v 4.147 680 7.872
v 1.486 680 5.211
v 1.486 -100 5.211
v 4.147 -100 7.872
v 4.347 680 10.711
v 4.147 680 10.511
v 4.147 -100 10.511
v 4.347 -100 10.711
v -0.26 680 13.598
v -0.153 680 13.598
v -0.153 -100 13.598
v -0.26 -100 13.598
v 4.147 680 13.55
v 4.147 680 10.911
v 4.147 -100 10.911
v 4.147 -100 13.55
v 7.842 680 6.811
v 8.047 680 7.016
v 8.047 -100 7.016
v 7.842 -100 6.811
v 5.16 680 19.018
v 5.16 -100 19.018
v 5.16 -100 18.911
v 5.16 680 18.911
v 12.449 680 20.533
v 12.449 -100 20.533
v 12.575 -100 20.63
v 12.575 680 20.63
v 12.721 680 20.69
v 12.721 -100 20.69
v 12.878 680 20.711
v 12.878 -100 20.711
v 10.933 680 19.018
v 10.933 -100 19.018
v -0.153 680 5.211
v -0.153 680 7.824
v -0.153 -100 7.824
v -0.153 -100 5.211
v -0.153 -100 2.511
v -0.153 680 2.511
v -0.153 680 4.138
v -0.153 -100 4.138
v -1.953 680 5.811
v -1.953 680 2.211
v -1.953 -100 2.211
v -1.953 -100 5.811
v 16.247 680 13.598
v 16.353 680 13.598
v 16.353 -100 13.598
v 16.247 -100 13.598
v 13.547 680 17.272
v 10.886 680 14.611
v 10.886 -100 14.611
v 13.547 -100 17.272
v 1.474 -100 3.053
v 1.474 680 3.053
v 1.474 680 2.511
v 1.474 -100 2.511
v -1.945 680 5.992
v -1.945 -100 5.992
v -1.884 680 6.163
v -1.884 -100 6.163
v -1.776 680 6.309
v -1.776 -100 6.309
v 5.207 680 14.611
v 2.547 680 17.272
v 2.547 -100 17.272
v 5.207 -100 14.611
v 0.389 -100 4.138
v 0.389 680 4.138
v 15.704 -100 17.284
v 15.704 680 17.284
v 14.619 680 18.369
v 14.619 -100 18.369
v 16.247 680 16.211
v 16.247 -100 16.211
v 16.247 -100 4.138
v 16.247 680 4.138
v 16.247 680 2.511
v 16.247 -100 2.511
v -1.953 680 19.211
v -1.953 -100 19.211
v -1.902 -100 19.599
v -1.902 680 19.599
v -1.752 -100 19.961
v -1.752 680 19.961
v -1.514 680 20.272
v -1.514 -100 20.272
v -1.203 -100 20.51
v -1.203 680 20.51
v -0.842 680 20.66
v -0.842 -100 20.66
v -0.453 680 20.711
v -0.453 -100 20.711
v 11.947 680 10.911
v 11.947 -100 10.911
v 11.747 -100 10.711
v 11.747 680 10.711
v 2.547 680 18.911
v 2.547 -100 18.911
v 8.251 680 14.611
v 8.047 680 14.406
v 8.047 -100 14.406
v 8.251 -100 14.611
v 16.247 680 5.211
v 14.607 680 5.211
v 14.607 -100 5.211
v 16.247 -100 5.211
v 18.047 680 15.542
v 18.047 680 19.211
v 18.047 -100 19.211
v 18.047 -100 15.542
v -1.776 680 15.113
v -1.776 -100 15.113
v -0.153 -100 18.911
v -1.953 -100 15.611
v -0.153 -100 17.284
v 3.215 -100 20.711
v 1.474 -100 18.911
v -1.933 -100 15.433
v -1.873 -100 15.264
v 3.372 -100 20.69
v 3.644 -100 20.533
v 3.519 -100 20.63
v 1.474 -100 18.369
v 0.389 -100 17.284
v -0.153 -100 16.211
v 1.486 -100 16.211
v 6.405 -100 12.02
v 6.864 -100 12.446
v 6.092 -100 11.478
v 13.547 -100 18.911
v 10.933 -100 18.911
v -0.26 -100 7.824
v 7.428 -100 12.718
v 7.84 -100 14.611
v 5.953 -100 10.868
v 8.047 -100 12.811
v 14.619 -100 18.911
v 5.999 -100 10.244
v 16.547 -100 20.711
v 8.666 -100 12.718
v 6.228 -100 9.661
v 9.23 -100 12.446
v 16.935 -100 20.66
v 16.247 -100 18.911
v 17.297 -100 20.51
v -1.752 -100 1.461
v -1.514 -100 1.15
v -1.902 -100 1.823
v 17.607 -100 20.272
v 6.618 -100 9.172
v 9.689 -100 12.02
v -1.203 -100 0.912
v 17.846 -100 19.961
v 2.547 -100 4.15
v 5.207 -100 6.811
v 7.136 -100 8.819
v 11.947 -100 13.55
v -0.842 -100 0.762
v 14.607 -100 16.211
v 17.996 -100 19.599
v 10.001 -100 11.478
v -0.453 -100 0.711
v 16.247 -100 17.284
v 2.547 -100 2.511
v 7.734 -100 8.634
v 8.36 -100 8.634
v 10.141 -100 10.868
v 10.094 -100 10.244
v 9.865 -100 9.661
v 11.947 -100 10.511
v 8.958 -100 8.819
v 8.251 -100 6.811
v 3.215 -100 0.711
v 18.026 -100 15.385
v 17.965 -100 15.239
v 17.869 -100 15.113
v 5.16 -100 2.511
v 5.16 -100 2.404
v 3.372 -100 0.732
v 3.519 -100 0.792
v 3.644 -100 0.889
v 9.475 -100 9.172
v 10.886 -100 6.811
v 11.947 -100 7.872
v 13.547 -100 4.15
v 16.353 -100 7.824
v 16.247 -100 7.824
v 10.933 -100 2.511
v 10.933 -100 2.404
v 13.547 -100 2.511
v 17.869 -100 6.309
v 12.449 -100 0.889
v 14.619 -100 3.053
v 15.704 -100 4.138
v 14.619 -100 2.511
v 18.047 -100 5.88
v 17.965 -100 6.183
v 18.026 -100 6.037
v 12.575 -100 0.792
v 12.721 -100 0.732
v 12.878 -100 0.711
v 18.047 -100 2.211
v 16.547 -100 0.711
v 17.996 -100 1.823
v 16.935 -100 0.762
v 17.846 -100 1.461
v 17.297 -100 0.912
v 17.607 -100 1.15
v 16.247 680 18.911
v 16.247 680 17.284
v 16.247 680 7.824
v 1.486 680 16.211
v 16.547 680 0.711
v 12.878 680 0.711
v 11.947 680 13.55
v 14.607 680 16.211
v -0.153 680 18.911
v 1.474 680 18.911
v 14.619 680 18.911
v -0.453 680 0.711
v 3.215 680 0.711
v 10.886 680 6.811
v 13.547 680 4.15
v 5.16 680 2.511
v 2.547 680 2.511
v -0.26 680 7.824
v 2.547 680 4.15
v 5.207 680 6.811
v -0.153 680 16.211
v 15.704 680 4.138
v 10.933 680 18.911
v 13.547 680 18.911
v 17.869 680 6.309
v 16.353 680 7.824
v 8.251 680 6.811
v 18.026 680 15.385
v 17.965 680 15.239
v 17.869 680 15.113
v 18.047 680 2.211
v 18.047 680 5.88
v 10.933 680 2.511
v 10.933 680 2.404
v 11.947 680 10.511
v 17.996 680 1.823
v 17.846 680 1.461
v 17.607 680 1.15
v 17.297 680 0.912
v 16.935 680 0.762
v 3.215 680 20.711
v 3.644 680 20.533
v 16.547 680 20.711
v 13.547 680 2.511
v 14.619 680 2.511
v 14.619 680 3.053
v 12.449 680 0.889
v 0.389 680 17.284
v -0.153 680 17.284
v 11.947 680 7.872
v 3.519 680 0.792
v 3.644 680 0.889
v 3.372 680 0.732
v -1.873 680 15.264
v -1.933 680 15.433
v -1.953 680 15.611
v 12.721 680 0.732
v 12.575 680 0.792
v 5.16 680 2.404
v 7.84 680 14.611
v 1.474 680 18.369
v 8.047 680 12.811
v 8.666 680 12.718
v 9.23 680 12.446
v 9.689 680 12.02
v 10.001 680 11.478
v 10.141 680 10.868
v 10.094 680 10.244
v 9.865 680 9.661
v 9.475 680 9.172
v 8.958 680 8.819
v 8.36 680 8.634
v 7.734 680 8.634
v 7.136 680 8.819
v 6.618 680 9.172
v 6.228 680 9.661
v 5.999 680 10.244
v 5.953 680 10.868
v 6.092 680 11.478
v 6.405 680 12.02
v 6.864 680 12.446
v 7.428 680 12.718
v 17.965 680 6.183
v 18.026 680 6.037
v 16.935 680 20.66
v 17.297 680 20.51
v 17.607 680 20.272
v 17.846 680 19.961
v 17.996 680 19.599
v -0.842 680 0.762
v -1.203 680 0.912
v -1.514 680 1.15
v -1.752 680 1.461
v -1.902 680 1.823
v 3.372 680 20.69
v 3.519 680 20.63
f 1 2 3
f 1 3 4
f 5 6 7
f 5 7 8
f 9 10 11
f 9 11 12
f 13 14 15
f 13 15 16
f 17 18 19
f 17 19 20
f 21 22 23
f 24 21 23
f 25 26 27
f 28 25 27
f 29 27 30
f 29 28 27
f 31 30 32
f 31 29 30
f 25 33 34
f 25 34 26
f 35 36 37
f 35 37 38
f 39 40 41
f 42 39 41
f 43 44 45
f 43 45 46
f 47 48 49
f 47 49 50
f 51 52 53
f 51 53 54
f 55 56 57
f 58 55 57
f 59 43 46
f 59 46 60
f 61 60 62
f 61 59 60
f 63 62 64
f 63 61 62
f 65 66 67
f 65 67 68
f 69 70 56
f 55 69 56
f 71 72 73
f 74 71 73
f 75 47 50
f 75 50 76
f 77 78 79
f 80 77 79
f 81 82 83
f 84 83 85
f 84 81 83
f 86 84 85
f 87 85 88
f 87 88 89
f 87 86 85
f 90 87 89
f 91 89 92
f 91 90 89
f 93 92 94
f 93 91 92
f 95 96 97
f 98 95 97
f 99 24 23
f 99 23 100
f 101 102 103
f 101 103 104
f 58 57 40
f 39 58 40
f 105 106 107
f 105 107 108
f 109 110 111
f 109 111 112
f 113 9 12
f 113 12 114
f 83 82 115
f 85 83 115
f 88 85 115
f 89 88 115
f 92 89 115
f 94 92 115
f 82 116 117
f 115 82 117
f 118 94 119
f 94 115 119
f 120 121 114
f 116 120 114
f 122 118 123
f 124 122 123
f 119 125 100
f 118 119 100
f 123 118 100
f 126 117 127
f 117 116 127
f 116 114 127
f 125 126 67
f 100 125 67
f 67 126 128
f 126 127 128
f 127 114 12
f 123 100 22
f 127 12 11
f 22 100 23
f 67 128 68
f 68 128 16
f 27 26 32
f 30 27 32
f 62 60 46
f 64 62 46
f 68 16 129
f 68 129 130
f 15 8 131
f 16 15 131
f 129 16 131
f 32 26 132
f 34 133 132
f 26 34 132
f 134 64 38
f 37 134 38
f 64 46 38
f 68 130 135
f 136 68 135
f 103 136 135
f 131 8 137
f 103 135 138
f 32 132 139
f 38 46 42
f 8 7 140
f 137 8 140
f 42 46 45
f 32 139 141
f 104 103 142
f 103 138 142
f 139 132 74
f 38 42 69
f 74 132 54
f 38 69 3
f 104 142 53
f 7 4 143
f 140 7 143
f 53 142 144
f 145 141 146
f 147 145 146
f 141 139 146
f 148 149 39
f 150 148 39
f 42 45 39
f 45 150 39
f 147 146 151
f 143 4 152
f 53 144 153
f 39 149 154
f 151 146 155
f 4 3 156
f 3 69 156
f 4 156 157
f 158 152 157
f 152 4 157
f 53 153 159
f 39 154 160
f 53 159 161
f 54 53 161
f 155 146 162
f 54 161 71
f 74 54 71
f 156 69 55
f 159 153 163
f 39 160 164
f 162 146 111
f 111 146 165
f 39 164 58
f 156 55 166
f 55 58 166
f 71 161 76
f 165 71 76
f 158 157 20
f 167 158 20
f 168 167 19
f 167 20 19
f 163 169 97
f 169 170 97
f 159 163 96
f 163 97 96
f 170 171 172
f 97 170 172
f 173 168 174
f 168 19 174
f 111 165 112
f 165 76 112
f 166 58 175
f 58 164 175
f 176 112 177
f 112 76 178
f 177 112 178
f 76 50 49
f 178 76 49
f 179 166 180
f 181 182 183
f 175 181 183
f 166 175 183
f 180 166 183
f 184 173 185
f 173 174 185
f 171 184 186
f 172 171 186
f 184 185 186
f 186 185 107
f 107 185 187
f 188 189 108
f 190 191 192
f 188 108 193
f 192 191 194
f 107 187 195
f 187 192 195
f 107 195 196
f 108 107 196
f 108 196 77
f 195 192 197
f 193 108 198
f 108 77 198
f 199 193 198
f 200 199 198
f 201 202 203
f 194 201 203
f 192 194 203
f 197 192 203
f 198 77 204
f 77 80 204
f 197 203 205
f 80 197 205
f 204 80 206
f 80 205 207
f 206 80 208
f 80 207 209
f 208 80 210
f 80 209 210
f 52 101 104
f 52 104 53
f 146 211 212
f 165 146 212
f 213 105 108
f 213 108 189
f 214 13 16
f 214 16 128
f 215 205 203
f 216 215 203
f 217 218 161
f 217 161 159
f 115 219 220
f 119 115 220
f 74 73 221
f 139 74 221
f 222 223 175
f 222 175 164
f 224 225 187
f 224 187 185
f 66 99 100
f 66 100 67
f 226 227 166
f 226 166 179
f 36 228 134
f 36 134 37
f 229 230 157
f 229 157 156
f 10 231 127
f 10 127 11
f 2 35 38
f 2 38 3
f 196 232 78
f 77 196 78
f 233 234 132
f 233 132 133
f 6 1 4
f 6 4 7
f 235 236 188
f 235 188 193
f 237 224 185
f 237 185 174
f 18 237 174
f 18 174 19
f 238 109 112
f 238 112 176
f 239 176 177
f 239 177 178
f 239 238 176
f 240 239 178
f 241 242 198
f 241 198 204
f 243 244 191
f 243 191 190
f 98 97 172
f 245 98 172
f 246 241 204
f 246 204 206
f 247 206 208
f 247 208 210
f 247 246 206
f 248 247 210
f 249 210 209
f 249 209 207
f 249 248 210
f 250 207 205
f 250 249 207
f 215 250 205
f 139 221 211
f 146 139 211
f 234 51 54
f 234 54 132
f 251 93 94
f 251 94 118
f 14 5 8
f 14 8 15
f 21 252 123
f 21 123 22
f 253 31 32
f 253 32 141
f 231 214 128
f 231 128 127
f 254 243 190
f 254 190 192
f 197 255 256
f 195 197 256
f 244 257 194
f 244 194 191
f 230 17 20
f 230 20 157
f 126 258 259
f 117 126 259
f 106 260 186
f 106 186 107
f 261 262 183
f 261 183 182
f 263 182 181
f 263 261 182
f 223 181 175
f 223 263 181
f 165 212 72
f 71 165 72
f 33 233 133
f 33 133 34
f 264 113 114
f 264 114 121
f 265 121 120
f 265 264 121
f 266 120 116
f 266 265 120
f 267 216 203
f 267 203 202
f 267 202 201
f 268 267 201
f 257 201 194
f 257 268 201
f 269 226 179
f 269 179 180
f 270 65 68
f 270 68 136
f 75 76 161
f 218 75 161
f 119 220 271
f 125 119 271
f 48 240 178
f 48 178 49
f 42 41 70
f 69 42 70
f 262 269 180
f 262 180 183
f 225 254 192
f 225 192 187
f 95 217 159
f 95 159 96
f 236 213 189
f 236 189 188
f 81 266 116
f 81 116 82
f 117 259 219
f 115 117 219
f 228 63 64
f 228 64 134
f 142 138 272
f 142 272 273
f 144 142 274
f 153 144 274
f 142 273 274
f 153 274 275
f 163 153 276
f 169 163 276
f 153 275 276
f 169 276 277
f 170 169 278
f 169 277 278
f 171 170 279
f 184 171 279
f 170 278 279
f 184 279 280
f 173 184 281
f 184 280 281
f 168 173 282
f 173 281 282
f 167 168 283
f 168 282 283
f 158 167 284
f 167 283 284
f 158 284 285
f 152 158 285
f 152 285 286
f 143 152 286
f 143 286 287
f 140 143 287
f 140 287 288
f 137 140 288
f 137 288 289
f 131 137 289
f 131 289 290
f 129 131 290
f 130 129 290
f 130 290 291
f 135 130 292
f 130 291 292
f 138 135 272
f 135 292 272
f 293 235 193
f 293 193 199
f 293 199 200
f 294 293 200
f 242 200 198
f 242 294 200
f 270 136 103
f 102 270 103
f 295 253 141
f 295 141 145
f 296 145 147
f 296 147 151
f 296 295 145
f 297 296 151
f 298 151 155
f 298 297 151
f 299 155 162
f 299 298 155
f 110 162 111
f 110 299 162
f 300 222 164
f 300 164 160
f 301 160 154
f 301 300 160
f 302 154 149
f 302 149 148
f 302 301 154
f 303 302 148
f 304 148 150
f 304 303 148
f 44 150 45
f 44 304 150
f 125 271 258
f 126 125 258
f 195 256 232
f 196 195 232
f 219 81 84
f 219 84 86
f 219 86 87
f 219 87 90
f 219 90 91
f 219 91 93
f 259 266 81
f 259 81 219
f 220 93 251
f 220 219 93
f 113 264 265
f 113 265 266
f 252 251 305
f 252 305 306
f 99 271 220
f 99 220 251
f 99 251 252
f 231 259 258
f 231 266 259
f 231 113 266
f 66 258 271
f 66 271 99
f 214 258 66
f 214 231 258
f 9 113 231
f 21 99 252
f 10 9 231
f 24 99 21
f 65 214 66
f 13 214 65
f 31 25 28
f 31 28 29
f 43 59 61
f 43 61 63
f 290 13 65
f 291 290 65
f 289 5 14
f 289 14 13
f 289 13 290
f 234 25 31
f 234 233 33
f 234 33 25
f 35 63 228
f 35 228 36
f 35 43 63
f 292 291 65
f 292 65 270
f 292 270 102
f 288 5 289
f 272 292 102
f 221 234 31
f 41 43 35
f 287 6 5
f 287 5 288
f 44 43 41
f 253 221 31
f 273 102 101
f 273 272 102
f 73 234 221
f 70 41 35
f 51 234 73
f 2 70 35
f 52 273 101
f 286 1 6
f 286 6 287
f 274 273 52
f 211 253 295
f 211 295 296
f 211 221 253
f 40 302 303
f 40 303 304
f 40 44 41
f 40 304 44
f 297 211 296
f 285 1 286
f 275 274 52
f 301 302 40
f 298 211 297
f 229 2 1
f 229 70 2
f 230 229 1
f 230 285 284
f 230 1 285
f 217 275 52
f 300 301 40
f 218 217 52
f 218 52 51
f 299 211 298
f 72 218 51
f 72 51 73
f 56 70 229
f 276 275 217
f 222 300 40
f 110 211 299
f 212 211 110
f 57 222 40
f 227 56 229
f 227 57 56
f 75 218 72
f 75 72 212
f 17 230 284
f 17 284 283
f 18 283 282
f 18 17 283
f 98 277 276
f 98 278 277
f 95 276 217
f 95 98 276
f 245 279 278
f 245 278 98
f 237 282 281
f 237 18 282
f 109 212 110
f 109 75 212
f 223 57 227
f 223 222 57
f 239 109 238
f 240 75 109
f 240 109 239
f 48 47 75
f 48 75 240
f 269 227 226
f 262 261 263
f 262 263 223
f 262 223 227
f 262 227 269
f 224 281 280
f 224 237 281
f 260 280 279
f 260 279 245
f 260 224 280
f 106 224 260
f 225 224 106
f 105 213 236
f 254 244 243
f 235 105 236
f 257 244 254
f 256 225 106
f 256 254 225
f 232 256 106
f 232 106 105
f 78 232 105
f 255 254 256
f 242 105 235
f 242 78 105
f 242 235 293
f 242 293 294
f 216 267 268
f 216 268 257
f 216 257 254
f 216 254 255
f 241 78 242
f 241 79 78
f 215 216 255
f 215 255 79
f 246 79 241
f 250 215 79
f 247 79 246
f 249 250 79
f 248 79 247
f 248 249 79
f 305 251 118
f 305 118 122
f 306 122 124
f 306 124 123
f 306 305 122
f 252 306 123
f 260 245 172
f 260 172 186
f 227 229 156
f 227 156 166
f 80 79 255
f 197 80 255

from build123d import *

# Parameters (mm, degrees)
SKETCH5_R           = 2.1
BOSS_EXTRUDE4_DEPTH = 780


with BuildPart() as part:
    # Sketch5 → Boss-Extrude4 (new body)
    with BuildSketch(Plane(origin=(0, 680, 0), x_dir=(1, 0, 0), z_dir=(0, 1, 0))):
        with BuildLine():
            Line((10.933291631, -2.510964723), (13.546664665, -2.510964723))
            Line((13.546664665, -2.510964723), (13.546664665, -4.150304529))
            Line((13.546664665, -4.150304529), (10.886004292, -6.810964917))
            Line((10.886004292, -6.810964917), (8.251433769, -6.810964917))
            Line((8.251433769, -6.810964917), (8.046664548, -7.015734138))
            Line((8.046664548, -7.015734138), (7.841895327, -6.810964917))
            Line((7.841895327, -6.810964917), (5.20732467, -6.810964917))
            Line((5.20732467, -6.810964917), (2.546664606, -4.150304933))
            Line((2.546664606, -4.150304933), (2.546664606, -2.510964723))
            Line((2.546664606, -2.510964723), (5.160037847, -2.510964723))
            Line((5.160037847, -2.510964723), (5.160037847, -2.404337587))
            Line((5.160037847, -2.404337587), (3.644466263, -0.888765902))
            ThreePointArc((3.644466263, -0.888765902), (3.447524808, -0.757173822), (3.215216519, -0.710964828))
            Line((3.215216519, -0.710964828), (-0.453335301, -0.710964828))
            ThreePointArc((-0.453335301, -0.710964828), (-1.51399556, -1.150304692), (-1.953335424, -2.210964951))
            Line((-1.953335424, -2.210964951), (-1.953335424, -5.810965145))
            ThreePointArc((-1.953335424, -5.810965145), (-1.920400619, -6.079855092), (-1.775534246, -6.308766076))
            Line((-1.775534246, -6.308766076), (-0.259962261, -7.82433806))
            Line((-0.259962261, -7.82433806), (-0.153335306, -7.82433806))
            Line((-0.153335306, -7.82433806), (-0.153335306, -5.210964844))
            Line((-0.153335306, -5.210964844), (1.48600445, -5.210964844))
            Line((1.48600445, -5.210964844), (4.146664635, -7.871625029))
            Line((4.146664635, -7.871625029), (4.146664635, -10.511096803))
            Line((4.146664635, -10.511096803), (4.346532653, -10.71096482))
            Line((4.346532653, -10.71096482), (4.146664635, -10.910832837))
            Line((4.146664635, -10.910832837), (4.146664635, -13.550304611))
            Line((4.146664635, -13.550304611), (1.486004498, -16.210964763))
            Line((1.486004498, -16.210964763), (-0.153335306, -16.210964763))
            Line((-0.153335306, -16.210964763), (-0.153335306, -13.597591958))
            Line((-0.153335306, -13.597591958), (-0.259962405, -13.597591958))
            Line((-0.259962405, -13.597591958), (-1.775534389, -15.113163943))
            ThreePointArc((-1.775534389, -15.113163943), (-1.907551313, -15.346664458), (-1.953335424, -15.610964996))
            Line((-1.953335424, -15.610964996), (-1.953335424, -19.210964568))
            ThreePointArc((-1.953335424, -19.210964568), (-1.513995592, -20.27162475), (-0.453335411, -20.710964582))
            Line((-0.453335411, -20.710964582), (3.215216577, -20.710964582))
            ThreePointArc((3.215216577, -20.710964582), (3.447524814, -20.6647556), (3.644466229, -20.533163554))
            Line((3.644466229, -20.533163554), (5.160037847, -19.017591936))
            Line((5.160037847, -19.017591936), (5.160037847, -18.910964955))
            Line((5.160037847, -18.910964955), (2.546664606, -18.910964955))
            Line((2.546664606, -18.910964955), (2.546664606, -17.271624993))
            Line((2.546664606, -17.271624993), (5.207324725, -14.610964873))
            Line((5.207324725, -14.610964873), (7.839690462, -14.610964873))
            Line((7.839690462, -14.610964873), (8.046664589, -14.406195535))
            Line((8.046664589, -14.406195535), (8.251433823, -14.610964873))
            Line((8.251433823, -14.610964873), (10.88600448, -14.610964873))
            Line((10.88600448, -14.610964873), (13.546664665, -17.271625059))
            Line((13.546664665, -17.271625059), (13.546664665, -18.910964955))
            Line((13.546664665, -18.910964955), (10.933291631, -18.910964955))
            Line((10.933291631, -18.910964955), (10.933291631, -19.017591953))
            Line((10.933291631, -19.017591953), (12.448863173, -20.533163494))
            ThreePointArc((12.448863173, -20.533163494), (12.645804654, -20.664755585), (12.878112969, -20.710964582))
            Line((12.878112969, -20.710964582), (16.546664468, -20.710964582))
            ThreePointArc((16.546664468, -20.710964582), (17.607324734, -20.271624715), (18.046664601, -19.210964449))
            Line((18.046664601, -19.210964449), (18.046664601, -15.542413801))
            ThreePointArc((18.046664601, -15.542413801), (18.000455626, -15.310105584), (17.868863597, -15.113164184))
            Line((17.868863597, -15.113164184), (16.353291472, -13.597591958))
            Line((16.353291472, -13.597591958), (16.246664762, -13.597591958))
            Line((16.246664762, -13.597591958), (16.246664762, -16.210964763))
            Line((16.246664762, -16.210964763), (14.607324803, -16.210964763))
            Line((14.607324803, -16.210964763), (11.94666457, -13.550304611))
            Line((11.94666457, -13.550304611), (11.94666457, -10.910832837))
            Line((11.94666457, -10.910832837), (11.746796552, -10.71096482))
            Line((11.746796552, -10.71096482), (11.94666457, -10.511096803))
            Line((11.94666457, -10.511096803), (11.94666457, -7.871625029))
            Line((11.94666457, -7.871625029), (14.607324755, -5.210964844))
            Line((14.607324755, -5.210964844), (16.246664762, -5.210964844))
            Line((16.246664762, -5.210964844), (16.246664762, -7.82433806))
            Line((16.246664762, -7.82433806), (16.353291723, -7.82433806))
            Line((16.353291723, -7.82433806), (17.868863593, -6.30876619))
            ThreePointArc((17.868863593, -6.30876619), (18.000455625, -6.111824797), (18.046664601, -5.879516585))
            Line((18.046664601, -5.879516585), (18.046664601, -2.210964977))
            ThreePointArc((18.046664601, -2.210964977), (17.60732473, -1.1503047), (16.546664453, -0.710964828))
            Line((16.546664453, -0.710964828), (12.87811338, -0.710964828))
            ThreePointArc((12.87811338, -0.710964828), (12.645805115, -0.757173815), (12.448863677, -0.888765877))
            Line((12.448863677, -0.888765877), (10.933291631, -2.404337922))
            Line((10.933291631, -2.404337922), (10.933291631, -2.510964723))
        make_face()
        with Locations(Location((8.046664646, -10.71096484, 0), (0, 0, 270))):
            Circle(SKETCH5_R, mode=Mode.SUBTRACT)
        Polygon((15.704247289, -4.138217153), (16.246664762, -4.138217153), (16.246664762, -2.510964723), (14.619412332, -2.510964723), (14.619412332, -3.053382543), align=None, mode=Mode.SUBTRACT)
        Polygon((16.246664762, -18.910964955), (16.246664762, -17.283712525), (15.704247289, -17.283712525), (14.619412332, -18.368547483), (14.619412332, -18.910964955), align=None, mode=Mode.SUBTRACT)
        Polygon((1.473917132, -3.053382195), (1.473917132, -2.510964723), (-0.153335306, -2.510964723), (-0.153335306, -4.138217153), (0.389082175, -4.138217153), align=None, mode=Mode.SUBTRACT)
        Polygon((1.473917132, -18.910964955), (1.473917132, -18.368547483), (0.389082175, -17.283712525), (-0.153335306, -17.283712525), (-0.153335306, -18.910964955), align=None, mode=Mode.SUBTRACT)
    extrude(amount=-BOSS_EXTRUDE4_DEPTH)


solid = part.part
